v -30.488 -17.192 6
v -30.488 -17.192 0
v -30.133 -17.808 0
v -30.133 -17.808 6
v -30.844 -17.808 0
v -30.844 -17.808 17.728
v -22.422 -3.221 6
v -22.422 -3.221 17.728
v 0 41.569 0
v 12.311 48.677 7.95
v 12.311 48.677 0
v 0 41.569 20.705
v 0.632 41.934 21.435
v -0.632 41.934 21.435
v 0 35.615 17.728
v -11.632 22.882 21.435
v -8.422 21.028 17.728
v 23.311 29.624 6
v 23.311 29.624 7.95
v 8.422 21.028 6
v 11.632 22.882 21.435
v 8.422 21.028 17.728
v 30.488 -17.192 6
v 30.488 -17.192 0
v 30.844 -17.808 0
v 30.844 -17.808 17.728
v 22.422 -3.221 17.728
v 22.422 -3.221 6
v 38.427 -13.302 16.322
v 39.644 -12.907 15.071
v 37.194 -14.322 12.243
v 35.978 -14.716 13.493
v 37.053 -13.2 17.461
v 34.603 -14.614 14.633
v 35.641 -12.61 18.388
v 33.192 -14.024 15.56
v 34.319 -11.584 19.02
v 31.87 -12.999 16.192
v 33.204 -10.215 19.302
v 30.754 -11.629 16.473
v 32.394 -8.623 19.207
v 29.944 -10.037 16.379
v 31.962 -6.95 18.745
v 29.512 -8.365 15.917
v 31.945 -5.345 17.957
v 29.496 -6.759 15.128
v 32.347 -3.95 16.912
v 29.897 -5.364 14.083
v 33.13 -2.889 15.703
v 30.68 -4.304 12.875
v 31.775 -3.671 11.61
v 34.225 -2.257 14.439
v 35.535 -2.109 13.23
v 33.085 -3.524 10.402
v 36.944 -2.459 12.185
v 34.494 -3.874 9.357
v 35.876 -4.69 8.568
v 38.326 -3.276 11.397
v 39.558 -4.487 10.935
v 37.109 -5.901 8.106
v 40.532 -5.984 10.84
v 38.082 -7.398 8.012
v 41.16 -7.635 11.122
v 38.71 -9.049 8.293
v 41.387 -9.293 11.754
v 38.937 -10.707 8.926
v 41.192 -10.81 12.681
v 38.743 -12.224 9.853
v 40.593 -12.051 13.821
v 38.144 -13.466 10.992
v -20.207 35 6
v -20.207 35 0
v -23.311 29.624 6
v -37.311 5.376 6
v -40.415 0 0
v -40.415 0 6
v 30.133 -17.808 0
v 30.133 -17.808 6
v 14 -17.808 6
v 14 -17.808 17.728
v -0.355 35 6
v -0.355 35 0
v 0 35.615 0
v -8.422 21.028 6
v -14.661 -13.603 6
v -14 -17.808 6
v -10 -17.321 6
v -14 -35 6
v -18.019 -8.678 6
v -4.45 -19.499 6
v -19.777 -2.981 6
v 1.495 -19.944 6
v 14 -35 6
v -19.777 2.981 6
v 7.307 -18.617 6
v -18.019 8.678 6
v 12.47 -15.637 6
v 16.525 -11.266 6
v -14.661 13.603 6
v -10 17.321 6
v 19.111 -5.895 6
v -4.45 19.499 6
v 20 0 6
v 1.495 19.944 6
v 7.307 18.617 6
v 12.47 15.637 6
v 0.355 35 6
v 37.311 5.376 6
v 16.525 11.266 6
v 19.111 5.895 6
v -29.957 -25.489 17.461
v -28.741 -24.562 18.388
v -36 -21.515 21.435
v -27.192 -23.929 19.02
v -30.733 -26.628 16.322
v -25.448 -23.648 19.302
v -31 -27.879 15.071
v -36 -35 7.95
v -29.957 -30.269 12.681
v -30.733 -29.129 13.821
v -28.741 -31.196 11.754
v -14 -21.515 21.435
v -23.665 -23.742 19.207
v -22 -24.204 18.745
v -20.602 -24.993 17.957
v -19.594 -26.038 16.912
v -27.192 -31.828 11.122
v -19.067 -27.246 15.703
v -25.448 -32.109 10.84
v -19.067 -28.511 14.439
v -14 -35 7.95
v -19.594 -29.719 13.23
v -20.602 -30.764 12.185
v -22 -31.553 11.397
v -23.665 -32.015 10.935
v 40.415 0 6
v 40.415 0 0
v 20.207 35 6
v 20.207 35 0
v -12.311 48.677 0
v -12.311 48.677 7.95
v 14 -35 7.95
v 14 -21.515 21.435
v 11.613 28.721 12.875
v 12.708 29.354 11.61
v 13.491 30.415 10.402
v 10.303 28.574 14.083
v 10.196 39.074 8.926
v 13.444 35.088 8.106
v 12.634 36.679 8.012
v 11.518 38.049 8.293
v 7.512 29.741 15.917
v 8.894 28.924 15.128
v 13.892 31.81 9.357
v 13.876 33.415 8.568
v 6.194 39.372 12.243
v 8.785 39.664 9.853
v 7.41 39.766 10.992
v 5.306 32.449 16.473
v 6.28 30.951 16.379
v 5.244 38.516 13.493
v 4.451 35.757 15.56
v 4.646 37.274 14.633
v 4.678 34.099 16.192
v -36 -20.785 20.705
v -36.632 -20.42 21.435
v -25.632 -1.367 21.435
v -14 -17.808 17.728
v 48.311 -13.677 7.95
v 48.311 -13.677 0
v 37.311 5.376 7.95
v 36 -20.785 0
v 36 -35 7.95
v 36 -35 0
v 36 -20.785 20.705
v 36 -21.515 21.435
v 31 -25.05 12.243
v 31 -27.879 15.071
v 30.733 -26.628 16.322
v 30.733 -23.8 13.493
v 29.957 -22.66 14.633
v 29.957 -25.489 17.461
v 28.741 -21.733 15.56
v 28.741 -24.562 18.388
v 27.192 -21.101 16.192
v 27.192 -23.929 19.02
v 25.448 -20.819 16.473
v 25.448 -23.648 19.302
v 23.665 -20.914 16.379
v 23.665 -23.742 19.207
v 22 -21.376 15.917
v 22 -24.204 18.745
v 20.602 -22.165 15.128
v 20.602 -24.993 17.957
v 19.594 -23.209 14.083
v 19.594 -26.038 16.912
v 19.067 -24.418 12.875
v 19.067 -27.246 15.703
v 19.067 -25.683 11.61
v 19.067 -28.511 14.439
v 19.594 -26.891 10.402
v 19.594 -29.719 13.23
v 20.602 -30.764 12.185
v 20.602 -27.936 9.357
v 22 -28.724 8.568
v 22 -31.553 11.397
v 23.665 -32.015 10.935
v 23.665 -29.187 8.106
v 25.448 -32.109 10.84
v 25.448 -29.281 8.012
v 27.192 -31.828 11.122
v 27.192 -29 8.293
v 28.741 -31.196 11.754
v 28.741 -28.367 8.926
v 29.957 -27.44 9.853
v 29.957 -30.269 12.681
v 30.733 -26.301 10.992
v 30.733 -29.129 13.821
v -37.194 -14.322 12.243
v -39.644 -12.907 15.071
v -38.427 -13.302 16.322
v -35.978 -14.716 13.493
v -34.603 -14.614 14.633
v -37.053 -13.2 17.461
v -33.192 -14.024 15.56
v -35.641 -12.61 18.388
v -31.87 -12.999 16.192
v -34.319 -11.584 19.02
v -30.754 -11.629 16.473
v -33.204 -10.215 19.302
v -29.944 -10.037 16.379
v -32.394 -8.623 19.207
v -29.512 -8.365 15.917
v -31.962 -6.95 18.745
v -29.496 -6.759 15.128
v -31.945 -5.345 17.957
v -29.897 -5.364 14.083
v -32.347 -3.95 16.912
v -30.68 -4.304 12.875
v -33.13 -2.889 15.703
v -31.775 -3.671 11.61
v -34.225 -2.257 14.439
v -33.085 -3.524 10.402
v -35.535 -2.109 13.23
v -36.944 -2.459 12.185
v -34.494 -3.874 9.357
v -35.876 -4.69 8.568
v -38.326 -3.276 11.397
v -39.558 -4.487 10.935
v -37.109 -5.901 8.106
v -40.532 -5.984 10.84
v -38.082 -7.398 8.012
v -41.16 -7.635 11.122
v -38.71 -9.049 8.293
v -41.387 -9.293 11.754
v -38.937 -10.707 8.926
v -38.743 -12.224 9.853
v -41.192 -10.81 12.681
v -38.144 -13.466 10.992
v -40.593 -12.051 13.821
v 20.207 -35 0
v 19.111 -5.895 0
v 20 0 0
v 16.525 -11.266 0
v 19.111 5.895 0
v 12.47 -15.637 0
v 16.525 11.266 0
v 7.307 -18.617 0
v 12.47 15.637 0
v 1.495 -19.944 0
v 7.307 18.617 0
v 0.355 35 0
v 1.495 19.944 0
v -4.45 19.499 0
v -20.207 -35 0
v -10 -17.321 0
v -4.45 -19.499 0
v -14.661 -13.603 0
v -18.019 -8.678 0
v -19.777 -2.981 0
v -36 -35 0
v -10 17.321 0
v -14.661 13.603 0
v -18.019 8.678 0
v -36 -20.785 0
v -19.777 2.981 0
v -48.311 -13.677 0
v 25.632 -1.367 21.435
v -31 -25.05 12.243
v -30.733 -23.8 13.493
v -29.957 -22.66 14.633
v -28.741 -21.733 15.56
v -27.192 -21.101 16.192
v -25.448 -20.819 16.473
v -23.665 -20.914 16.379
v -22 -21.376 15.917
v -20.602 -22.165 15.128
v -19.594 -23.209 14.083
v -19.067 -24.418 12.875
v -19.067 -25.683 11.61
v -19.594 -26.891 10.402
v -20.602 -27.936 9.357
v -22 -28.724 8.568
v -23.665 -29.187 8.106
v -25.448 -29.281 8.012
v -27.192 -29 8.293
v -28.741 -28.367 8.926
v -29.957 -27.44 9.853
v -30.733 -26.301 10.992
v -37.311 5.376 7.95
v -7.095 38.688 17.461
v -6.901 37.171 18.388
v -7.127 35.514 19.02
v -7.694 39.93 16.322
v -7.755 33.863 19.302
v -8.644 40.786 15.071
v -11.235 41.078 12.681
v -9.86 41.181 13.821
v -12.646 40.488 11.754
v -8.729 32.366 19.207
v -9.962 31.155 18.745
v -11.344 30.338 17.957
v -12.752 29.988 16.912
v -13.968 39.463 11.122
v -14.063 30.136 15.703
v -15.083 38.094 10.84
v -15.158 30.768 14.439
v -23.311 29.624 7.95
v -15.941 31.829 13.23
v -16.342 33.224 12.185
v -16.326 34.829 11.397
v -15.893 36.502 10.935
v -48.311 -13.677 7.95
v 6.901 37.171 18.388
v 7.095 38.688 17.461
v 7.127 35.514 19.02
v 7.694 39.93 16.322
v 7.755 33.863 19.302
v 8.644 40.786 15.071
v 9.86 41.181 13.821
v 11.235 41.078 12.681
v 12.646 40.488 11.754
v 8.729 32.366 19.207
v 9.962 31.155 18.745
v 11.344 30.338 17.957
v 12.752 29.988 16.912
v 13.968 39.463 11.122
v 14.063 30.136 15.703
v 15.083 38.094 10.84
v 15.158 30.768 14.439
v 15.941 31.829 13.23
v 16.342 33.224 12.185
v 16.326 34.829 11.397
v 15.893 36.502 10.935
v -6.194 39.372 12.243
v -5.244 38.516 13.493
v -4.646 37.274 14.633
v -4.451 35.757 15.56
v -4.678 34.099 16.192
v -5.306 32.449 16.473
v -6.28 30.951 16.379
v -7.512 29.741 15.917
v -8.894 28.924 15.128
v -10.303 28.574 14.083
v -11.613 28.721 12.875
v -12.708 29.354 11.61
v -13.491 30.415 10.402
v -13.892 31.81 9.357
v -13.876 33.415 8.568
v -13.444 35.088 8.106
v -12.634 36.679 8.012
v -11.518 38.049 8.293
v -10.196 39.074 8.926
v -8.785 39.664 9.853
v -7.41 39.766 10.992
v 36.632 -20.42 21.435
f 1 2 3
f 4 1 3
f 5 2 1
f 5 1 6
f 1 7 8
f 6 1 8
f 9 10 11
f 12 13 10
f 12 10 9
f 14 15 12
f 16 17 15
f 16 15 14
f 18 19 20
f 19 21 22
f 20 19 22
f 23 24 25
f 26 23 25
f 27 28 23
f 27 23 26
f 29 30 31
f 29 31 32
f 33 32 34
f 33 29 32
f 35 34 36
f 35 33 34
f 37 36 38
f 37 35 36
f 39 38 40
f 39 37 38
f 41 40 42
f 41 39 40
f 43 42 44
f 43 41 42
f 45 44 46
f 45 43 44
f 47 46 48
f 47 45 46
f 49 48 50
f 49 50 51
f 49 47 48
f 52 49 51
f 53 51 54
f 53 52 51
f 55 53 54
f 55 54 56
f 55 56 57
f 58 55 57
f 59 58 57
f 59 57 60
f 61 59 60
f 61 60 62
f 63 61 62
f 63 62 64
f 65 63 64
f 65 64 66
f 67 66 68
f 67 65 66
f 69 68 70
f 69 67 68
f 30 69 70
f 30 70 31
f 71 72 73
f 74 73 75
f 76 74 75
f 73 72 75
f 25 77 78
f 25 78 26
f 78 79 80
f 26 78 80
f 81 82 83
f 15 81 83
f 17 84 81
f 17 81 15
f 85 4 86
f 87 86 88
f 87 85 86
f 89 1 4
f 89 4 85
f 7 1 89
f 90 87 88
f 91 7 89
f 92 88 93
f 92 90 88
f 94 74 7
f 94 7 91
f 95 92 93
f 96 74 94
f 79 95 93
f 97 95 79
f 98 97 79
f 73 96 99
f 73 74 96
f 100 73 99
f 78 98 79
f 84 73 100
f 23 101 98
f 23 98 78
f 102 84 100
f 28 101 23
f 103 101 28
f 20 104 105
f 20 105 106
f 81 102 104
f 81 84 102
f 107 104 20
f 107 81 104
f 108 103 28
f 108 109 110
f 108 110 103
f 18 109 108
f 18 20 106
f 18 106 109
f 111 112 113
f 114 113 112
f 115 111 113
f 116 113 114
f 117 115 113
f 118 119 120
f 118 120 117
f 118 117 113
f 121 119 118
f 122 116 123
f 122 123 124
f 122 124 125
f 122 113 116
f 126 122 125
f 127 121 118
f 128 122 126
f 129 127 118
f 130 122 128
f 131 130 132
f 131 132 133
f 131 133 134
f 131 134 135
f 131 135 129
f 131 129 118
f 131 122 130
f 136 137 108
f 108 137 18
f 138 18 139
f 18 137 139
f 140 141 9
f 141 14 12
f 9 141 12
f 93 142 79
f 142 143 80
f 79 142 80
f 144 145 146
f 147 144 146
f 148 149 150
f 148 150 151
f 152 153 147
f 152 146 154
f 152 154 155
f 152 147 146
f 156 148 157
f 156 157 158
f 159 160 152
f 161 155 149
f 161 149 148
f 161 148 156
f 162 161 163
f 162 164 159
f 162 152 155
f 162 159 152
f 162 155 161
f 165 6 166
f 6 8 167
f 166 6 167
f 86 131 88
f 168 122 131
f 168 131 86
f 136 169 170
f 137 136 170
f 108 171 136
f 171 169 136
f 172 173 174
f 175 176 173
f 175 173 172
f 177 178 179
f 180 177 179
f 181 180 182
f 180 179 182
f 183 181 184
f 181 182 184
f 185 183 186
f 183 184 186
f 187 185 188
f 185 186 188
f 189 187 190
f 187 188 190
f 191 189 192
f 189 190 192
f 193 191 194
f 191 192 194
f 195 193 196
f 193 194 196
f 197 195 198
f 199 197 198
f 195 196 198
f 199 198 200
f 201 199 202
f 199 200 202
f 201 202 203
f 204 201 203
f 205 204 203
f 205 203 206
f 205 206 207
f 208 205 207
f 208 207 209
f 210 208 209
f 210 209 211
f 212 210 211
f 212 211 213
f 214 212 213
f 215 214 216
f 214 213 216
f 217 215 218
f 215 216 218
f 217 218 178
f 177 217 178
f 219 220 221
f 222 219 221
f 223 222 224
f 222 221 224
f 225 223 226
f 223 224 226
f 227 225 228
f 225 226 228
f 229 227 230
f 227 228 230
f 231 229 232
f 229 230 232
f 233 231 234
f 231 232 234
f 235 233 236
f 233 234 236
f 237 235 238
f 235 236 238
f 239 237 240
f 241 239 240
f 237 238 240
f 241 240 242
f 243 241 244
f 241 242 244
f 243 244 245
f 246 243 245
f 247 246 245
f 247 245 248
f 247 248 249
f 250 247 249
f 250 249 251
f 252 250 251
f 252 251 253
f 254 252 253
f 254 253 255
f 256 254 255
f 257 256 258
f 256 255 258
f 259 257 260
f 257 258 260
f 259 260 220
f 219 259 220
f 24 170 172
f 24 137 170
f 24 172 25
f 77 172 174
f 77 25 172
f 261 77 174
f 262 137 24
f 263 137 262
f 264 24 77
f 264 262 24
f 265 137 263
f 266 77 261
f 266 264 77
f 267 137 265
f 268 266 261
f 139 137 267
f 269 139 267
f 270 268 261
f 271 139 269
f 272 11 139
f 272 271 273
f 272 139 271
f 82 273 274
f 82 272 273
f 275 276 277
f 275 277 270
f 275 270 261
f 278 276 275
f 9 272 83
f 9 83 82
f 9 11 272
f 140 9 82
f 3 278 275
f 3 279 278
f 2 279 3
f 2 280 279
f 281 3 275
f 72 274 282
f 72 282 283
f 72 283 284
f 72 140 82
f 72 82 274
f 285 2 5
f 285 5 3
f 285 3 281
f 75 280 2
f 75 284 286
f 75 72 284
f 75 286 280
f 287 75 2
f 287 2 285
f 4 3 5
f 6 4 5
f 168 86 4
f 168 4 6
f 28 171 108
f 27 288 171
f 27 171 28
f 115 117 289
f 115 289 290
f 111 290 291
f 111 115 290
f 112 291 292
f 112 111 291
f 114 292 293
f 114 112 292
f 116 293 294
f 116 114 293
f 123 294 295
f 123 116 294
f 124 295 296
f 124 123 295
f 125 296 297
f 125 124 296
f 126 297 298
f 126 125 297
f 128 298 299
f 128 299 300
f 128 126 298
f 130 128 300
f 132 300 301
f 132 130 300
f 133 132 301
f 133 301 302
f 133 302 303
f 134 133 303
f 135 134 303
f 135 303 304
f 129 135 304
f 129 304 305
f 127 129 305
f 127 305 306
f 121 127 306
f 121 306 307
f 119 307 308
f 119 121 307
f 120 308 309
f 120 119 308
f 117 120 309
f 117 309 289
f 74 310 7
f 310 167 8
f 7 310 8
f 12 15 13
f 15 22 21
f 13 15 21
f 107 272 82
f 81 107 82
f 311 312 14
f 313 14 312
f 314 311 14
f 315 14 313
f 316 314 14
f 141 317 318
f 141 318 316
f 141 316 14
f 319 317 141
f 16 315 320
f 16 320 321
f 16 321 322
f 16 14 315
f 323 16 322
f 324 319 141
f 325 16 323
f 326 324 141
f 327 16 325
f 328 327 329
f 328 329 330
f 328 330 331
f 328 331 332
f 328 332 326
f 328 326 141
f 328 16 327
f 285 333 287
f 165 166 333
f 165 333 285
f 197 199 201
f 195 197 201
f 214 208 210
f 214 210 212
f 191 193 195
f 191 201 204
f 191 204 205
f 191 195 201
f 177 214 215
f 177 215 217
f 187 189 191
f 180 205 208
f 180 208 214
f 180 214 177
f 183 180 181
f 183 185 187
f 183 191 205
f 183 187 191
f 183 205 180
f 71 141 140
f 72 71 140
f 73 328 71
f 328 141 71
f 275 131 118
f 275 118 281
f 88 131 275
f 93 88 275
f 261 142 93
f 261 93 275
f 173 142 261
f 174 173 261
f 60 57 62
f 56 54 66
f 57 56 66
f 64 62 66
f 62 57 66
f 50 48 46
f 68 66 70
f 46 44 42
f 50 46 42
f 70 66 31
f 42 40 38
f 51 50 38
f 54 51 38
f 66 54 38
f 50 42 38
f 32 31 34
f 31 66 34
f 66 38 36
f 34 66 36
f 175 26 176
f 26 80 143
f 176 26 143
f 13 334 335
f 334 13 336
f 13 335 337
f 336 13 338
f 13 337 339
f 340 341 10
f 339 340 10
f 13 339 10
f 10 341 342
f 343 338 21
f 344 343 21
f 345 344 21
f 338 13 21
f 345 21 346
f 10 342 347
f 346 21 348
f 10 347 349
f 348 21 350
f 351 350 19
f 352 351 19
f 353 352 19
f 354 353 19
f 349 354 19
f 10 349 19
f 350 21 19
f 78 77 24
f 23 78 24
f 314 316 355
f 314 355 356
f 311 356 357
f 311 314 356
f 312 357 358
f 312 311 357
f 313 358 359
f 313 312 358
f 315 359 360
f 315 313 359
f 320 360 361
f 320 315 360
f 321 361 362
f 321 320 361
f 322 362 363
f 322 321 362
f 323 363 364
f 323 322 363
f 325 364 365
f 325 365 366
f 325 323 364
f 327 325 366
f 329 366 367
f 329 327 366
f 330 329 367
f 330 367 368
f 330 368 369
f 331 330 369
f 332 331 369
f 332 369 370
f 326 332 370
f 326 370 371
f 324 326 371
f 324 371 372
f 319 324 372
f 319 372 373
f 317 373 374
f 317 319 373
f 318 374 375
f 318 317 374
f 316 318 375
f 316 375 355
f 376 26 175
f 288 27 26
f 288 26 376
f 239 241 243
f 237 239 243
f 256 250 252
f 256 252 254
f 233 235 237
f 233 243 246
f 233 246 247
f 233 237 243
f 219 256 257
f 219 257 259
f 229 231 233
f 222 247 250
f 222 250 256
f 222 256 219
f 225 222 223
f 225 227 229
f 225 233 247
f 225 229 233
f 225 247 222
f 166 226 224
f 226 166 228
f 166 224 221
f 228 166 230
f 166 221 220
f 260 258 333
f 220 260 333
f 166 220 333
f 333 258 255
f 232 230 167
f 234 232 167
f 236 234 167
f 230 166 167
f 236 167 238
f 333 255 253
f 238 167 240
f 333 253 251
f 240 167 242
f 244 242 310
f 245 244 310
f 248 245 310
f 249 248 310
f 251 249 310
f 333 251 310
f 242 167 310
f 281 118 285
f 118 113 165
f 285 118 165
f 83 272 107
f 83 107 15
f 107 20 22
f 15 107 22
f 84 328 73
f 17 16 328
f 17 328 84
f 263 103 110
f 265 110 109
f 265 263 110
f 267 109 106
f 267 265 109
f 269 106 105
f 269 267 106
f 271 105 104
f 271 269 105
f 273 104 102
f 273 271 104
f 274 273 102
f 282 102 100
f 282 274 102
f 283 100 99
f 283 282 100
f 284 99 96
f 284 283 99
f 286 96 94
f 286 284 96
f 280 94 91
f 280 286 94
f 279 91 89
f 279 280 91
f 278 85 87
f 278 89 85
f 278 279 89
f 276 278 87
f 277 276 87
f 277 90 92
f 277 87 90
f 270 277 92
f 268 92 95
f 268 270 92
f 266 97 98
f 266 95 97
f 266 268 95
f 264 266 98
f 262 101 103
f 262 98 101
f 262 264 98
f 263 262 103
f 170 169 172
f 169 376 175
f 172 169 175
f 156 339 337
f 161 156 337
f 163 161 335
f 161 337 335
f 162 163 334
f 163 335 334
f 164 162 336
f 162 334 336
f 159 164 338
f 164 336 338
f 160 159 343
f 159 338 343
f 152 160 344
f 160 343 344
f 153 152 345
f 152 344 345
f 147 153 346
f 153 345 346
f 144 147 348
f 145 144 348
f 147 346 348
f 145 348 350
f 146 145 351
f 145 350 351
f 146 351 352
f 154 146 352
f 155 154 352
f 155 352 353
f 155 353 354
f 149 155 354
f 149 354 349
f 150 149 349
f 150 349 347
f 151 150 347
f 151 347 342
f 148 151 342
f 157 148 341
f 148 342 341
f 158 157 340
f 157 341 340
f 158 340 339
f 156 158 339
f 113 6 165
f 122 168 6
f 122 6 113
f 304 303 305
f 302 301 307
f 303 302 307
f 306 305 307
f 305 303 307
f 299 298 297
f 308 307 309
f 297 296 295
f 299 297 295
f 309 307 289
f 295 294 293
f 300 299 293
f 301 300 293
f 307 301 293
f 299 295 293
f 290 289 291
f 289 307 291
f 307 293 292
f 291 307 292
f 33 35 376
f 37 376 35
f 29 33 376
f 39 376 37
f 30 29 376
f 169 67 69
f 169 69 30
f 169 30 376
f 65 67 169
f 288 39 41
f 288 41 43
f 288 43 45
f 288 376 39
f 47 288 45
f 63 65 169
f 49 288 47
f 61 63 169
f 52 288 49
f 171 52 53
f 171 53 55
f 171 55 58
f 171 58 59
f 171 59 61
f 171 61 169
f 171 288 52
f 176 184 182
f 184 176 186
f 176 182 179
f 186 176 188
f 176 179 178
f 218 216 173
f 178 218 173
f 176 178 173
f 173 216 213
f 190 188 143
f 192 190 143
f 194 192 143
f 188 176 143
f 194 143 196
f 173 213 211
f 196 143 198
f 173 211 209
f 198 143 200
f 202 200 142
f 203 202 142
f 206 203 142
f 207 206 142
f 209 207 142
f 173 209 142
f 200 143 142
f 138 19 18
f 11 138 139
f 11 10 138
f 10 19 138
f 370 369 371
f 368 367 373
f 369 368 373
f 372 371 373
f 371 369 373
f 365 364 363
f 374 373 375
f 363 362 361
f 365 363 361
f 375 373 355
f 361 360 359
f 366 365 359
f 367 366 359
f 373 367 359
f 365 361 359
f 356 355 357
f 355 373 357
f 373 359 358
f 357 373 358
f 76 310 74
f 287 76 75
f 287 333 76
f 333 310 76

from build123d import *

# Parameters (mm, degrees)
F0_R     = 20
F1_DEPTH = 6
F3_START = 14
F3_DEPTH = 22
F4_R     = 6
F5_DEPTH = 4
F7_COUNT = 3


with BuildPart() as f1:
    # F0 (on Top) → F1 (new body)
    with BuildSketch(Plane.XY):
        Polygon((20.2072594216, 35), (-20.2072594216, 35), (-40.4145188433, 0), (-20.2072594216, -35), (20.2072594216, -35), (40.4145188433, 0), align=None)
        Circle(F0_R, mode=Mode.SUBTRACT)
    extrude(amount=F1_DEPTH)

    # F2 (on Right) → F3 (join)
    with BuildSketch(Plane.YZ.offset(F3_START)):
        Polygon((-29.2928932188, 8), (-32.1213203436, 10.8284271247), (-35, 7.9497474683), (-35, 0), (-17.8076118446, 0), (-17.8076118446, 17.7279220614), (-21.5147186258, 21.4350288425), (-23.6360389693, 19.313708499), (-20.8076118446, 16.4852813742), align=None)
        Polygon((-23.6360389693, 19.313708499), (-32.1213203436, 10.8284271247), (-29.2928932188, 8), (-20.8076118446, 16.4852813742), align=None)
    extrude(amount=F3_DEPTH)

    # F4 (on face) → F5 (cut)
    with BuildSketch(Plane(origin=(0, -21.4748737342, 21.4748737342), x_dir=(1, 0, 0), z_dir=(0, -0.7071067812, 0.7071067812))):
        with Locations((25, -9.0563491861)):
            Circle(F4_R)
    extrude(amount=-F5_DEPTH, mode=Mode.SUBTRACT)

    # F6: F1 across plane


with BuildPart() as f1_1:
    add(f1.part)
    add(f1.part.mirror(Plane.YZ))

    # F7: F1 ×3 about axis
    f7_axis = Axis((0, 0, 0), (0, 0, -1))


with BuildPart() as f1_2:
    add(f1_1.part)
    for i in range(1, F7_COUNT):
        add(f1_1.part.rotate(f7_axis, i * 360 / F7_COUNT))


solid = f1_2.part
